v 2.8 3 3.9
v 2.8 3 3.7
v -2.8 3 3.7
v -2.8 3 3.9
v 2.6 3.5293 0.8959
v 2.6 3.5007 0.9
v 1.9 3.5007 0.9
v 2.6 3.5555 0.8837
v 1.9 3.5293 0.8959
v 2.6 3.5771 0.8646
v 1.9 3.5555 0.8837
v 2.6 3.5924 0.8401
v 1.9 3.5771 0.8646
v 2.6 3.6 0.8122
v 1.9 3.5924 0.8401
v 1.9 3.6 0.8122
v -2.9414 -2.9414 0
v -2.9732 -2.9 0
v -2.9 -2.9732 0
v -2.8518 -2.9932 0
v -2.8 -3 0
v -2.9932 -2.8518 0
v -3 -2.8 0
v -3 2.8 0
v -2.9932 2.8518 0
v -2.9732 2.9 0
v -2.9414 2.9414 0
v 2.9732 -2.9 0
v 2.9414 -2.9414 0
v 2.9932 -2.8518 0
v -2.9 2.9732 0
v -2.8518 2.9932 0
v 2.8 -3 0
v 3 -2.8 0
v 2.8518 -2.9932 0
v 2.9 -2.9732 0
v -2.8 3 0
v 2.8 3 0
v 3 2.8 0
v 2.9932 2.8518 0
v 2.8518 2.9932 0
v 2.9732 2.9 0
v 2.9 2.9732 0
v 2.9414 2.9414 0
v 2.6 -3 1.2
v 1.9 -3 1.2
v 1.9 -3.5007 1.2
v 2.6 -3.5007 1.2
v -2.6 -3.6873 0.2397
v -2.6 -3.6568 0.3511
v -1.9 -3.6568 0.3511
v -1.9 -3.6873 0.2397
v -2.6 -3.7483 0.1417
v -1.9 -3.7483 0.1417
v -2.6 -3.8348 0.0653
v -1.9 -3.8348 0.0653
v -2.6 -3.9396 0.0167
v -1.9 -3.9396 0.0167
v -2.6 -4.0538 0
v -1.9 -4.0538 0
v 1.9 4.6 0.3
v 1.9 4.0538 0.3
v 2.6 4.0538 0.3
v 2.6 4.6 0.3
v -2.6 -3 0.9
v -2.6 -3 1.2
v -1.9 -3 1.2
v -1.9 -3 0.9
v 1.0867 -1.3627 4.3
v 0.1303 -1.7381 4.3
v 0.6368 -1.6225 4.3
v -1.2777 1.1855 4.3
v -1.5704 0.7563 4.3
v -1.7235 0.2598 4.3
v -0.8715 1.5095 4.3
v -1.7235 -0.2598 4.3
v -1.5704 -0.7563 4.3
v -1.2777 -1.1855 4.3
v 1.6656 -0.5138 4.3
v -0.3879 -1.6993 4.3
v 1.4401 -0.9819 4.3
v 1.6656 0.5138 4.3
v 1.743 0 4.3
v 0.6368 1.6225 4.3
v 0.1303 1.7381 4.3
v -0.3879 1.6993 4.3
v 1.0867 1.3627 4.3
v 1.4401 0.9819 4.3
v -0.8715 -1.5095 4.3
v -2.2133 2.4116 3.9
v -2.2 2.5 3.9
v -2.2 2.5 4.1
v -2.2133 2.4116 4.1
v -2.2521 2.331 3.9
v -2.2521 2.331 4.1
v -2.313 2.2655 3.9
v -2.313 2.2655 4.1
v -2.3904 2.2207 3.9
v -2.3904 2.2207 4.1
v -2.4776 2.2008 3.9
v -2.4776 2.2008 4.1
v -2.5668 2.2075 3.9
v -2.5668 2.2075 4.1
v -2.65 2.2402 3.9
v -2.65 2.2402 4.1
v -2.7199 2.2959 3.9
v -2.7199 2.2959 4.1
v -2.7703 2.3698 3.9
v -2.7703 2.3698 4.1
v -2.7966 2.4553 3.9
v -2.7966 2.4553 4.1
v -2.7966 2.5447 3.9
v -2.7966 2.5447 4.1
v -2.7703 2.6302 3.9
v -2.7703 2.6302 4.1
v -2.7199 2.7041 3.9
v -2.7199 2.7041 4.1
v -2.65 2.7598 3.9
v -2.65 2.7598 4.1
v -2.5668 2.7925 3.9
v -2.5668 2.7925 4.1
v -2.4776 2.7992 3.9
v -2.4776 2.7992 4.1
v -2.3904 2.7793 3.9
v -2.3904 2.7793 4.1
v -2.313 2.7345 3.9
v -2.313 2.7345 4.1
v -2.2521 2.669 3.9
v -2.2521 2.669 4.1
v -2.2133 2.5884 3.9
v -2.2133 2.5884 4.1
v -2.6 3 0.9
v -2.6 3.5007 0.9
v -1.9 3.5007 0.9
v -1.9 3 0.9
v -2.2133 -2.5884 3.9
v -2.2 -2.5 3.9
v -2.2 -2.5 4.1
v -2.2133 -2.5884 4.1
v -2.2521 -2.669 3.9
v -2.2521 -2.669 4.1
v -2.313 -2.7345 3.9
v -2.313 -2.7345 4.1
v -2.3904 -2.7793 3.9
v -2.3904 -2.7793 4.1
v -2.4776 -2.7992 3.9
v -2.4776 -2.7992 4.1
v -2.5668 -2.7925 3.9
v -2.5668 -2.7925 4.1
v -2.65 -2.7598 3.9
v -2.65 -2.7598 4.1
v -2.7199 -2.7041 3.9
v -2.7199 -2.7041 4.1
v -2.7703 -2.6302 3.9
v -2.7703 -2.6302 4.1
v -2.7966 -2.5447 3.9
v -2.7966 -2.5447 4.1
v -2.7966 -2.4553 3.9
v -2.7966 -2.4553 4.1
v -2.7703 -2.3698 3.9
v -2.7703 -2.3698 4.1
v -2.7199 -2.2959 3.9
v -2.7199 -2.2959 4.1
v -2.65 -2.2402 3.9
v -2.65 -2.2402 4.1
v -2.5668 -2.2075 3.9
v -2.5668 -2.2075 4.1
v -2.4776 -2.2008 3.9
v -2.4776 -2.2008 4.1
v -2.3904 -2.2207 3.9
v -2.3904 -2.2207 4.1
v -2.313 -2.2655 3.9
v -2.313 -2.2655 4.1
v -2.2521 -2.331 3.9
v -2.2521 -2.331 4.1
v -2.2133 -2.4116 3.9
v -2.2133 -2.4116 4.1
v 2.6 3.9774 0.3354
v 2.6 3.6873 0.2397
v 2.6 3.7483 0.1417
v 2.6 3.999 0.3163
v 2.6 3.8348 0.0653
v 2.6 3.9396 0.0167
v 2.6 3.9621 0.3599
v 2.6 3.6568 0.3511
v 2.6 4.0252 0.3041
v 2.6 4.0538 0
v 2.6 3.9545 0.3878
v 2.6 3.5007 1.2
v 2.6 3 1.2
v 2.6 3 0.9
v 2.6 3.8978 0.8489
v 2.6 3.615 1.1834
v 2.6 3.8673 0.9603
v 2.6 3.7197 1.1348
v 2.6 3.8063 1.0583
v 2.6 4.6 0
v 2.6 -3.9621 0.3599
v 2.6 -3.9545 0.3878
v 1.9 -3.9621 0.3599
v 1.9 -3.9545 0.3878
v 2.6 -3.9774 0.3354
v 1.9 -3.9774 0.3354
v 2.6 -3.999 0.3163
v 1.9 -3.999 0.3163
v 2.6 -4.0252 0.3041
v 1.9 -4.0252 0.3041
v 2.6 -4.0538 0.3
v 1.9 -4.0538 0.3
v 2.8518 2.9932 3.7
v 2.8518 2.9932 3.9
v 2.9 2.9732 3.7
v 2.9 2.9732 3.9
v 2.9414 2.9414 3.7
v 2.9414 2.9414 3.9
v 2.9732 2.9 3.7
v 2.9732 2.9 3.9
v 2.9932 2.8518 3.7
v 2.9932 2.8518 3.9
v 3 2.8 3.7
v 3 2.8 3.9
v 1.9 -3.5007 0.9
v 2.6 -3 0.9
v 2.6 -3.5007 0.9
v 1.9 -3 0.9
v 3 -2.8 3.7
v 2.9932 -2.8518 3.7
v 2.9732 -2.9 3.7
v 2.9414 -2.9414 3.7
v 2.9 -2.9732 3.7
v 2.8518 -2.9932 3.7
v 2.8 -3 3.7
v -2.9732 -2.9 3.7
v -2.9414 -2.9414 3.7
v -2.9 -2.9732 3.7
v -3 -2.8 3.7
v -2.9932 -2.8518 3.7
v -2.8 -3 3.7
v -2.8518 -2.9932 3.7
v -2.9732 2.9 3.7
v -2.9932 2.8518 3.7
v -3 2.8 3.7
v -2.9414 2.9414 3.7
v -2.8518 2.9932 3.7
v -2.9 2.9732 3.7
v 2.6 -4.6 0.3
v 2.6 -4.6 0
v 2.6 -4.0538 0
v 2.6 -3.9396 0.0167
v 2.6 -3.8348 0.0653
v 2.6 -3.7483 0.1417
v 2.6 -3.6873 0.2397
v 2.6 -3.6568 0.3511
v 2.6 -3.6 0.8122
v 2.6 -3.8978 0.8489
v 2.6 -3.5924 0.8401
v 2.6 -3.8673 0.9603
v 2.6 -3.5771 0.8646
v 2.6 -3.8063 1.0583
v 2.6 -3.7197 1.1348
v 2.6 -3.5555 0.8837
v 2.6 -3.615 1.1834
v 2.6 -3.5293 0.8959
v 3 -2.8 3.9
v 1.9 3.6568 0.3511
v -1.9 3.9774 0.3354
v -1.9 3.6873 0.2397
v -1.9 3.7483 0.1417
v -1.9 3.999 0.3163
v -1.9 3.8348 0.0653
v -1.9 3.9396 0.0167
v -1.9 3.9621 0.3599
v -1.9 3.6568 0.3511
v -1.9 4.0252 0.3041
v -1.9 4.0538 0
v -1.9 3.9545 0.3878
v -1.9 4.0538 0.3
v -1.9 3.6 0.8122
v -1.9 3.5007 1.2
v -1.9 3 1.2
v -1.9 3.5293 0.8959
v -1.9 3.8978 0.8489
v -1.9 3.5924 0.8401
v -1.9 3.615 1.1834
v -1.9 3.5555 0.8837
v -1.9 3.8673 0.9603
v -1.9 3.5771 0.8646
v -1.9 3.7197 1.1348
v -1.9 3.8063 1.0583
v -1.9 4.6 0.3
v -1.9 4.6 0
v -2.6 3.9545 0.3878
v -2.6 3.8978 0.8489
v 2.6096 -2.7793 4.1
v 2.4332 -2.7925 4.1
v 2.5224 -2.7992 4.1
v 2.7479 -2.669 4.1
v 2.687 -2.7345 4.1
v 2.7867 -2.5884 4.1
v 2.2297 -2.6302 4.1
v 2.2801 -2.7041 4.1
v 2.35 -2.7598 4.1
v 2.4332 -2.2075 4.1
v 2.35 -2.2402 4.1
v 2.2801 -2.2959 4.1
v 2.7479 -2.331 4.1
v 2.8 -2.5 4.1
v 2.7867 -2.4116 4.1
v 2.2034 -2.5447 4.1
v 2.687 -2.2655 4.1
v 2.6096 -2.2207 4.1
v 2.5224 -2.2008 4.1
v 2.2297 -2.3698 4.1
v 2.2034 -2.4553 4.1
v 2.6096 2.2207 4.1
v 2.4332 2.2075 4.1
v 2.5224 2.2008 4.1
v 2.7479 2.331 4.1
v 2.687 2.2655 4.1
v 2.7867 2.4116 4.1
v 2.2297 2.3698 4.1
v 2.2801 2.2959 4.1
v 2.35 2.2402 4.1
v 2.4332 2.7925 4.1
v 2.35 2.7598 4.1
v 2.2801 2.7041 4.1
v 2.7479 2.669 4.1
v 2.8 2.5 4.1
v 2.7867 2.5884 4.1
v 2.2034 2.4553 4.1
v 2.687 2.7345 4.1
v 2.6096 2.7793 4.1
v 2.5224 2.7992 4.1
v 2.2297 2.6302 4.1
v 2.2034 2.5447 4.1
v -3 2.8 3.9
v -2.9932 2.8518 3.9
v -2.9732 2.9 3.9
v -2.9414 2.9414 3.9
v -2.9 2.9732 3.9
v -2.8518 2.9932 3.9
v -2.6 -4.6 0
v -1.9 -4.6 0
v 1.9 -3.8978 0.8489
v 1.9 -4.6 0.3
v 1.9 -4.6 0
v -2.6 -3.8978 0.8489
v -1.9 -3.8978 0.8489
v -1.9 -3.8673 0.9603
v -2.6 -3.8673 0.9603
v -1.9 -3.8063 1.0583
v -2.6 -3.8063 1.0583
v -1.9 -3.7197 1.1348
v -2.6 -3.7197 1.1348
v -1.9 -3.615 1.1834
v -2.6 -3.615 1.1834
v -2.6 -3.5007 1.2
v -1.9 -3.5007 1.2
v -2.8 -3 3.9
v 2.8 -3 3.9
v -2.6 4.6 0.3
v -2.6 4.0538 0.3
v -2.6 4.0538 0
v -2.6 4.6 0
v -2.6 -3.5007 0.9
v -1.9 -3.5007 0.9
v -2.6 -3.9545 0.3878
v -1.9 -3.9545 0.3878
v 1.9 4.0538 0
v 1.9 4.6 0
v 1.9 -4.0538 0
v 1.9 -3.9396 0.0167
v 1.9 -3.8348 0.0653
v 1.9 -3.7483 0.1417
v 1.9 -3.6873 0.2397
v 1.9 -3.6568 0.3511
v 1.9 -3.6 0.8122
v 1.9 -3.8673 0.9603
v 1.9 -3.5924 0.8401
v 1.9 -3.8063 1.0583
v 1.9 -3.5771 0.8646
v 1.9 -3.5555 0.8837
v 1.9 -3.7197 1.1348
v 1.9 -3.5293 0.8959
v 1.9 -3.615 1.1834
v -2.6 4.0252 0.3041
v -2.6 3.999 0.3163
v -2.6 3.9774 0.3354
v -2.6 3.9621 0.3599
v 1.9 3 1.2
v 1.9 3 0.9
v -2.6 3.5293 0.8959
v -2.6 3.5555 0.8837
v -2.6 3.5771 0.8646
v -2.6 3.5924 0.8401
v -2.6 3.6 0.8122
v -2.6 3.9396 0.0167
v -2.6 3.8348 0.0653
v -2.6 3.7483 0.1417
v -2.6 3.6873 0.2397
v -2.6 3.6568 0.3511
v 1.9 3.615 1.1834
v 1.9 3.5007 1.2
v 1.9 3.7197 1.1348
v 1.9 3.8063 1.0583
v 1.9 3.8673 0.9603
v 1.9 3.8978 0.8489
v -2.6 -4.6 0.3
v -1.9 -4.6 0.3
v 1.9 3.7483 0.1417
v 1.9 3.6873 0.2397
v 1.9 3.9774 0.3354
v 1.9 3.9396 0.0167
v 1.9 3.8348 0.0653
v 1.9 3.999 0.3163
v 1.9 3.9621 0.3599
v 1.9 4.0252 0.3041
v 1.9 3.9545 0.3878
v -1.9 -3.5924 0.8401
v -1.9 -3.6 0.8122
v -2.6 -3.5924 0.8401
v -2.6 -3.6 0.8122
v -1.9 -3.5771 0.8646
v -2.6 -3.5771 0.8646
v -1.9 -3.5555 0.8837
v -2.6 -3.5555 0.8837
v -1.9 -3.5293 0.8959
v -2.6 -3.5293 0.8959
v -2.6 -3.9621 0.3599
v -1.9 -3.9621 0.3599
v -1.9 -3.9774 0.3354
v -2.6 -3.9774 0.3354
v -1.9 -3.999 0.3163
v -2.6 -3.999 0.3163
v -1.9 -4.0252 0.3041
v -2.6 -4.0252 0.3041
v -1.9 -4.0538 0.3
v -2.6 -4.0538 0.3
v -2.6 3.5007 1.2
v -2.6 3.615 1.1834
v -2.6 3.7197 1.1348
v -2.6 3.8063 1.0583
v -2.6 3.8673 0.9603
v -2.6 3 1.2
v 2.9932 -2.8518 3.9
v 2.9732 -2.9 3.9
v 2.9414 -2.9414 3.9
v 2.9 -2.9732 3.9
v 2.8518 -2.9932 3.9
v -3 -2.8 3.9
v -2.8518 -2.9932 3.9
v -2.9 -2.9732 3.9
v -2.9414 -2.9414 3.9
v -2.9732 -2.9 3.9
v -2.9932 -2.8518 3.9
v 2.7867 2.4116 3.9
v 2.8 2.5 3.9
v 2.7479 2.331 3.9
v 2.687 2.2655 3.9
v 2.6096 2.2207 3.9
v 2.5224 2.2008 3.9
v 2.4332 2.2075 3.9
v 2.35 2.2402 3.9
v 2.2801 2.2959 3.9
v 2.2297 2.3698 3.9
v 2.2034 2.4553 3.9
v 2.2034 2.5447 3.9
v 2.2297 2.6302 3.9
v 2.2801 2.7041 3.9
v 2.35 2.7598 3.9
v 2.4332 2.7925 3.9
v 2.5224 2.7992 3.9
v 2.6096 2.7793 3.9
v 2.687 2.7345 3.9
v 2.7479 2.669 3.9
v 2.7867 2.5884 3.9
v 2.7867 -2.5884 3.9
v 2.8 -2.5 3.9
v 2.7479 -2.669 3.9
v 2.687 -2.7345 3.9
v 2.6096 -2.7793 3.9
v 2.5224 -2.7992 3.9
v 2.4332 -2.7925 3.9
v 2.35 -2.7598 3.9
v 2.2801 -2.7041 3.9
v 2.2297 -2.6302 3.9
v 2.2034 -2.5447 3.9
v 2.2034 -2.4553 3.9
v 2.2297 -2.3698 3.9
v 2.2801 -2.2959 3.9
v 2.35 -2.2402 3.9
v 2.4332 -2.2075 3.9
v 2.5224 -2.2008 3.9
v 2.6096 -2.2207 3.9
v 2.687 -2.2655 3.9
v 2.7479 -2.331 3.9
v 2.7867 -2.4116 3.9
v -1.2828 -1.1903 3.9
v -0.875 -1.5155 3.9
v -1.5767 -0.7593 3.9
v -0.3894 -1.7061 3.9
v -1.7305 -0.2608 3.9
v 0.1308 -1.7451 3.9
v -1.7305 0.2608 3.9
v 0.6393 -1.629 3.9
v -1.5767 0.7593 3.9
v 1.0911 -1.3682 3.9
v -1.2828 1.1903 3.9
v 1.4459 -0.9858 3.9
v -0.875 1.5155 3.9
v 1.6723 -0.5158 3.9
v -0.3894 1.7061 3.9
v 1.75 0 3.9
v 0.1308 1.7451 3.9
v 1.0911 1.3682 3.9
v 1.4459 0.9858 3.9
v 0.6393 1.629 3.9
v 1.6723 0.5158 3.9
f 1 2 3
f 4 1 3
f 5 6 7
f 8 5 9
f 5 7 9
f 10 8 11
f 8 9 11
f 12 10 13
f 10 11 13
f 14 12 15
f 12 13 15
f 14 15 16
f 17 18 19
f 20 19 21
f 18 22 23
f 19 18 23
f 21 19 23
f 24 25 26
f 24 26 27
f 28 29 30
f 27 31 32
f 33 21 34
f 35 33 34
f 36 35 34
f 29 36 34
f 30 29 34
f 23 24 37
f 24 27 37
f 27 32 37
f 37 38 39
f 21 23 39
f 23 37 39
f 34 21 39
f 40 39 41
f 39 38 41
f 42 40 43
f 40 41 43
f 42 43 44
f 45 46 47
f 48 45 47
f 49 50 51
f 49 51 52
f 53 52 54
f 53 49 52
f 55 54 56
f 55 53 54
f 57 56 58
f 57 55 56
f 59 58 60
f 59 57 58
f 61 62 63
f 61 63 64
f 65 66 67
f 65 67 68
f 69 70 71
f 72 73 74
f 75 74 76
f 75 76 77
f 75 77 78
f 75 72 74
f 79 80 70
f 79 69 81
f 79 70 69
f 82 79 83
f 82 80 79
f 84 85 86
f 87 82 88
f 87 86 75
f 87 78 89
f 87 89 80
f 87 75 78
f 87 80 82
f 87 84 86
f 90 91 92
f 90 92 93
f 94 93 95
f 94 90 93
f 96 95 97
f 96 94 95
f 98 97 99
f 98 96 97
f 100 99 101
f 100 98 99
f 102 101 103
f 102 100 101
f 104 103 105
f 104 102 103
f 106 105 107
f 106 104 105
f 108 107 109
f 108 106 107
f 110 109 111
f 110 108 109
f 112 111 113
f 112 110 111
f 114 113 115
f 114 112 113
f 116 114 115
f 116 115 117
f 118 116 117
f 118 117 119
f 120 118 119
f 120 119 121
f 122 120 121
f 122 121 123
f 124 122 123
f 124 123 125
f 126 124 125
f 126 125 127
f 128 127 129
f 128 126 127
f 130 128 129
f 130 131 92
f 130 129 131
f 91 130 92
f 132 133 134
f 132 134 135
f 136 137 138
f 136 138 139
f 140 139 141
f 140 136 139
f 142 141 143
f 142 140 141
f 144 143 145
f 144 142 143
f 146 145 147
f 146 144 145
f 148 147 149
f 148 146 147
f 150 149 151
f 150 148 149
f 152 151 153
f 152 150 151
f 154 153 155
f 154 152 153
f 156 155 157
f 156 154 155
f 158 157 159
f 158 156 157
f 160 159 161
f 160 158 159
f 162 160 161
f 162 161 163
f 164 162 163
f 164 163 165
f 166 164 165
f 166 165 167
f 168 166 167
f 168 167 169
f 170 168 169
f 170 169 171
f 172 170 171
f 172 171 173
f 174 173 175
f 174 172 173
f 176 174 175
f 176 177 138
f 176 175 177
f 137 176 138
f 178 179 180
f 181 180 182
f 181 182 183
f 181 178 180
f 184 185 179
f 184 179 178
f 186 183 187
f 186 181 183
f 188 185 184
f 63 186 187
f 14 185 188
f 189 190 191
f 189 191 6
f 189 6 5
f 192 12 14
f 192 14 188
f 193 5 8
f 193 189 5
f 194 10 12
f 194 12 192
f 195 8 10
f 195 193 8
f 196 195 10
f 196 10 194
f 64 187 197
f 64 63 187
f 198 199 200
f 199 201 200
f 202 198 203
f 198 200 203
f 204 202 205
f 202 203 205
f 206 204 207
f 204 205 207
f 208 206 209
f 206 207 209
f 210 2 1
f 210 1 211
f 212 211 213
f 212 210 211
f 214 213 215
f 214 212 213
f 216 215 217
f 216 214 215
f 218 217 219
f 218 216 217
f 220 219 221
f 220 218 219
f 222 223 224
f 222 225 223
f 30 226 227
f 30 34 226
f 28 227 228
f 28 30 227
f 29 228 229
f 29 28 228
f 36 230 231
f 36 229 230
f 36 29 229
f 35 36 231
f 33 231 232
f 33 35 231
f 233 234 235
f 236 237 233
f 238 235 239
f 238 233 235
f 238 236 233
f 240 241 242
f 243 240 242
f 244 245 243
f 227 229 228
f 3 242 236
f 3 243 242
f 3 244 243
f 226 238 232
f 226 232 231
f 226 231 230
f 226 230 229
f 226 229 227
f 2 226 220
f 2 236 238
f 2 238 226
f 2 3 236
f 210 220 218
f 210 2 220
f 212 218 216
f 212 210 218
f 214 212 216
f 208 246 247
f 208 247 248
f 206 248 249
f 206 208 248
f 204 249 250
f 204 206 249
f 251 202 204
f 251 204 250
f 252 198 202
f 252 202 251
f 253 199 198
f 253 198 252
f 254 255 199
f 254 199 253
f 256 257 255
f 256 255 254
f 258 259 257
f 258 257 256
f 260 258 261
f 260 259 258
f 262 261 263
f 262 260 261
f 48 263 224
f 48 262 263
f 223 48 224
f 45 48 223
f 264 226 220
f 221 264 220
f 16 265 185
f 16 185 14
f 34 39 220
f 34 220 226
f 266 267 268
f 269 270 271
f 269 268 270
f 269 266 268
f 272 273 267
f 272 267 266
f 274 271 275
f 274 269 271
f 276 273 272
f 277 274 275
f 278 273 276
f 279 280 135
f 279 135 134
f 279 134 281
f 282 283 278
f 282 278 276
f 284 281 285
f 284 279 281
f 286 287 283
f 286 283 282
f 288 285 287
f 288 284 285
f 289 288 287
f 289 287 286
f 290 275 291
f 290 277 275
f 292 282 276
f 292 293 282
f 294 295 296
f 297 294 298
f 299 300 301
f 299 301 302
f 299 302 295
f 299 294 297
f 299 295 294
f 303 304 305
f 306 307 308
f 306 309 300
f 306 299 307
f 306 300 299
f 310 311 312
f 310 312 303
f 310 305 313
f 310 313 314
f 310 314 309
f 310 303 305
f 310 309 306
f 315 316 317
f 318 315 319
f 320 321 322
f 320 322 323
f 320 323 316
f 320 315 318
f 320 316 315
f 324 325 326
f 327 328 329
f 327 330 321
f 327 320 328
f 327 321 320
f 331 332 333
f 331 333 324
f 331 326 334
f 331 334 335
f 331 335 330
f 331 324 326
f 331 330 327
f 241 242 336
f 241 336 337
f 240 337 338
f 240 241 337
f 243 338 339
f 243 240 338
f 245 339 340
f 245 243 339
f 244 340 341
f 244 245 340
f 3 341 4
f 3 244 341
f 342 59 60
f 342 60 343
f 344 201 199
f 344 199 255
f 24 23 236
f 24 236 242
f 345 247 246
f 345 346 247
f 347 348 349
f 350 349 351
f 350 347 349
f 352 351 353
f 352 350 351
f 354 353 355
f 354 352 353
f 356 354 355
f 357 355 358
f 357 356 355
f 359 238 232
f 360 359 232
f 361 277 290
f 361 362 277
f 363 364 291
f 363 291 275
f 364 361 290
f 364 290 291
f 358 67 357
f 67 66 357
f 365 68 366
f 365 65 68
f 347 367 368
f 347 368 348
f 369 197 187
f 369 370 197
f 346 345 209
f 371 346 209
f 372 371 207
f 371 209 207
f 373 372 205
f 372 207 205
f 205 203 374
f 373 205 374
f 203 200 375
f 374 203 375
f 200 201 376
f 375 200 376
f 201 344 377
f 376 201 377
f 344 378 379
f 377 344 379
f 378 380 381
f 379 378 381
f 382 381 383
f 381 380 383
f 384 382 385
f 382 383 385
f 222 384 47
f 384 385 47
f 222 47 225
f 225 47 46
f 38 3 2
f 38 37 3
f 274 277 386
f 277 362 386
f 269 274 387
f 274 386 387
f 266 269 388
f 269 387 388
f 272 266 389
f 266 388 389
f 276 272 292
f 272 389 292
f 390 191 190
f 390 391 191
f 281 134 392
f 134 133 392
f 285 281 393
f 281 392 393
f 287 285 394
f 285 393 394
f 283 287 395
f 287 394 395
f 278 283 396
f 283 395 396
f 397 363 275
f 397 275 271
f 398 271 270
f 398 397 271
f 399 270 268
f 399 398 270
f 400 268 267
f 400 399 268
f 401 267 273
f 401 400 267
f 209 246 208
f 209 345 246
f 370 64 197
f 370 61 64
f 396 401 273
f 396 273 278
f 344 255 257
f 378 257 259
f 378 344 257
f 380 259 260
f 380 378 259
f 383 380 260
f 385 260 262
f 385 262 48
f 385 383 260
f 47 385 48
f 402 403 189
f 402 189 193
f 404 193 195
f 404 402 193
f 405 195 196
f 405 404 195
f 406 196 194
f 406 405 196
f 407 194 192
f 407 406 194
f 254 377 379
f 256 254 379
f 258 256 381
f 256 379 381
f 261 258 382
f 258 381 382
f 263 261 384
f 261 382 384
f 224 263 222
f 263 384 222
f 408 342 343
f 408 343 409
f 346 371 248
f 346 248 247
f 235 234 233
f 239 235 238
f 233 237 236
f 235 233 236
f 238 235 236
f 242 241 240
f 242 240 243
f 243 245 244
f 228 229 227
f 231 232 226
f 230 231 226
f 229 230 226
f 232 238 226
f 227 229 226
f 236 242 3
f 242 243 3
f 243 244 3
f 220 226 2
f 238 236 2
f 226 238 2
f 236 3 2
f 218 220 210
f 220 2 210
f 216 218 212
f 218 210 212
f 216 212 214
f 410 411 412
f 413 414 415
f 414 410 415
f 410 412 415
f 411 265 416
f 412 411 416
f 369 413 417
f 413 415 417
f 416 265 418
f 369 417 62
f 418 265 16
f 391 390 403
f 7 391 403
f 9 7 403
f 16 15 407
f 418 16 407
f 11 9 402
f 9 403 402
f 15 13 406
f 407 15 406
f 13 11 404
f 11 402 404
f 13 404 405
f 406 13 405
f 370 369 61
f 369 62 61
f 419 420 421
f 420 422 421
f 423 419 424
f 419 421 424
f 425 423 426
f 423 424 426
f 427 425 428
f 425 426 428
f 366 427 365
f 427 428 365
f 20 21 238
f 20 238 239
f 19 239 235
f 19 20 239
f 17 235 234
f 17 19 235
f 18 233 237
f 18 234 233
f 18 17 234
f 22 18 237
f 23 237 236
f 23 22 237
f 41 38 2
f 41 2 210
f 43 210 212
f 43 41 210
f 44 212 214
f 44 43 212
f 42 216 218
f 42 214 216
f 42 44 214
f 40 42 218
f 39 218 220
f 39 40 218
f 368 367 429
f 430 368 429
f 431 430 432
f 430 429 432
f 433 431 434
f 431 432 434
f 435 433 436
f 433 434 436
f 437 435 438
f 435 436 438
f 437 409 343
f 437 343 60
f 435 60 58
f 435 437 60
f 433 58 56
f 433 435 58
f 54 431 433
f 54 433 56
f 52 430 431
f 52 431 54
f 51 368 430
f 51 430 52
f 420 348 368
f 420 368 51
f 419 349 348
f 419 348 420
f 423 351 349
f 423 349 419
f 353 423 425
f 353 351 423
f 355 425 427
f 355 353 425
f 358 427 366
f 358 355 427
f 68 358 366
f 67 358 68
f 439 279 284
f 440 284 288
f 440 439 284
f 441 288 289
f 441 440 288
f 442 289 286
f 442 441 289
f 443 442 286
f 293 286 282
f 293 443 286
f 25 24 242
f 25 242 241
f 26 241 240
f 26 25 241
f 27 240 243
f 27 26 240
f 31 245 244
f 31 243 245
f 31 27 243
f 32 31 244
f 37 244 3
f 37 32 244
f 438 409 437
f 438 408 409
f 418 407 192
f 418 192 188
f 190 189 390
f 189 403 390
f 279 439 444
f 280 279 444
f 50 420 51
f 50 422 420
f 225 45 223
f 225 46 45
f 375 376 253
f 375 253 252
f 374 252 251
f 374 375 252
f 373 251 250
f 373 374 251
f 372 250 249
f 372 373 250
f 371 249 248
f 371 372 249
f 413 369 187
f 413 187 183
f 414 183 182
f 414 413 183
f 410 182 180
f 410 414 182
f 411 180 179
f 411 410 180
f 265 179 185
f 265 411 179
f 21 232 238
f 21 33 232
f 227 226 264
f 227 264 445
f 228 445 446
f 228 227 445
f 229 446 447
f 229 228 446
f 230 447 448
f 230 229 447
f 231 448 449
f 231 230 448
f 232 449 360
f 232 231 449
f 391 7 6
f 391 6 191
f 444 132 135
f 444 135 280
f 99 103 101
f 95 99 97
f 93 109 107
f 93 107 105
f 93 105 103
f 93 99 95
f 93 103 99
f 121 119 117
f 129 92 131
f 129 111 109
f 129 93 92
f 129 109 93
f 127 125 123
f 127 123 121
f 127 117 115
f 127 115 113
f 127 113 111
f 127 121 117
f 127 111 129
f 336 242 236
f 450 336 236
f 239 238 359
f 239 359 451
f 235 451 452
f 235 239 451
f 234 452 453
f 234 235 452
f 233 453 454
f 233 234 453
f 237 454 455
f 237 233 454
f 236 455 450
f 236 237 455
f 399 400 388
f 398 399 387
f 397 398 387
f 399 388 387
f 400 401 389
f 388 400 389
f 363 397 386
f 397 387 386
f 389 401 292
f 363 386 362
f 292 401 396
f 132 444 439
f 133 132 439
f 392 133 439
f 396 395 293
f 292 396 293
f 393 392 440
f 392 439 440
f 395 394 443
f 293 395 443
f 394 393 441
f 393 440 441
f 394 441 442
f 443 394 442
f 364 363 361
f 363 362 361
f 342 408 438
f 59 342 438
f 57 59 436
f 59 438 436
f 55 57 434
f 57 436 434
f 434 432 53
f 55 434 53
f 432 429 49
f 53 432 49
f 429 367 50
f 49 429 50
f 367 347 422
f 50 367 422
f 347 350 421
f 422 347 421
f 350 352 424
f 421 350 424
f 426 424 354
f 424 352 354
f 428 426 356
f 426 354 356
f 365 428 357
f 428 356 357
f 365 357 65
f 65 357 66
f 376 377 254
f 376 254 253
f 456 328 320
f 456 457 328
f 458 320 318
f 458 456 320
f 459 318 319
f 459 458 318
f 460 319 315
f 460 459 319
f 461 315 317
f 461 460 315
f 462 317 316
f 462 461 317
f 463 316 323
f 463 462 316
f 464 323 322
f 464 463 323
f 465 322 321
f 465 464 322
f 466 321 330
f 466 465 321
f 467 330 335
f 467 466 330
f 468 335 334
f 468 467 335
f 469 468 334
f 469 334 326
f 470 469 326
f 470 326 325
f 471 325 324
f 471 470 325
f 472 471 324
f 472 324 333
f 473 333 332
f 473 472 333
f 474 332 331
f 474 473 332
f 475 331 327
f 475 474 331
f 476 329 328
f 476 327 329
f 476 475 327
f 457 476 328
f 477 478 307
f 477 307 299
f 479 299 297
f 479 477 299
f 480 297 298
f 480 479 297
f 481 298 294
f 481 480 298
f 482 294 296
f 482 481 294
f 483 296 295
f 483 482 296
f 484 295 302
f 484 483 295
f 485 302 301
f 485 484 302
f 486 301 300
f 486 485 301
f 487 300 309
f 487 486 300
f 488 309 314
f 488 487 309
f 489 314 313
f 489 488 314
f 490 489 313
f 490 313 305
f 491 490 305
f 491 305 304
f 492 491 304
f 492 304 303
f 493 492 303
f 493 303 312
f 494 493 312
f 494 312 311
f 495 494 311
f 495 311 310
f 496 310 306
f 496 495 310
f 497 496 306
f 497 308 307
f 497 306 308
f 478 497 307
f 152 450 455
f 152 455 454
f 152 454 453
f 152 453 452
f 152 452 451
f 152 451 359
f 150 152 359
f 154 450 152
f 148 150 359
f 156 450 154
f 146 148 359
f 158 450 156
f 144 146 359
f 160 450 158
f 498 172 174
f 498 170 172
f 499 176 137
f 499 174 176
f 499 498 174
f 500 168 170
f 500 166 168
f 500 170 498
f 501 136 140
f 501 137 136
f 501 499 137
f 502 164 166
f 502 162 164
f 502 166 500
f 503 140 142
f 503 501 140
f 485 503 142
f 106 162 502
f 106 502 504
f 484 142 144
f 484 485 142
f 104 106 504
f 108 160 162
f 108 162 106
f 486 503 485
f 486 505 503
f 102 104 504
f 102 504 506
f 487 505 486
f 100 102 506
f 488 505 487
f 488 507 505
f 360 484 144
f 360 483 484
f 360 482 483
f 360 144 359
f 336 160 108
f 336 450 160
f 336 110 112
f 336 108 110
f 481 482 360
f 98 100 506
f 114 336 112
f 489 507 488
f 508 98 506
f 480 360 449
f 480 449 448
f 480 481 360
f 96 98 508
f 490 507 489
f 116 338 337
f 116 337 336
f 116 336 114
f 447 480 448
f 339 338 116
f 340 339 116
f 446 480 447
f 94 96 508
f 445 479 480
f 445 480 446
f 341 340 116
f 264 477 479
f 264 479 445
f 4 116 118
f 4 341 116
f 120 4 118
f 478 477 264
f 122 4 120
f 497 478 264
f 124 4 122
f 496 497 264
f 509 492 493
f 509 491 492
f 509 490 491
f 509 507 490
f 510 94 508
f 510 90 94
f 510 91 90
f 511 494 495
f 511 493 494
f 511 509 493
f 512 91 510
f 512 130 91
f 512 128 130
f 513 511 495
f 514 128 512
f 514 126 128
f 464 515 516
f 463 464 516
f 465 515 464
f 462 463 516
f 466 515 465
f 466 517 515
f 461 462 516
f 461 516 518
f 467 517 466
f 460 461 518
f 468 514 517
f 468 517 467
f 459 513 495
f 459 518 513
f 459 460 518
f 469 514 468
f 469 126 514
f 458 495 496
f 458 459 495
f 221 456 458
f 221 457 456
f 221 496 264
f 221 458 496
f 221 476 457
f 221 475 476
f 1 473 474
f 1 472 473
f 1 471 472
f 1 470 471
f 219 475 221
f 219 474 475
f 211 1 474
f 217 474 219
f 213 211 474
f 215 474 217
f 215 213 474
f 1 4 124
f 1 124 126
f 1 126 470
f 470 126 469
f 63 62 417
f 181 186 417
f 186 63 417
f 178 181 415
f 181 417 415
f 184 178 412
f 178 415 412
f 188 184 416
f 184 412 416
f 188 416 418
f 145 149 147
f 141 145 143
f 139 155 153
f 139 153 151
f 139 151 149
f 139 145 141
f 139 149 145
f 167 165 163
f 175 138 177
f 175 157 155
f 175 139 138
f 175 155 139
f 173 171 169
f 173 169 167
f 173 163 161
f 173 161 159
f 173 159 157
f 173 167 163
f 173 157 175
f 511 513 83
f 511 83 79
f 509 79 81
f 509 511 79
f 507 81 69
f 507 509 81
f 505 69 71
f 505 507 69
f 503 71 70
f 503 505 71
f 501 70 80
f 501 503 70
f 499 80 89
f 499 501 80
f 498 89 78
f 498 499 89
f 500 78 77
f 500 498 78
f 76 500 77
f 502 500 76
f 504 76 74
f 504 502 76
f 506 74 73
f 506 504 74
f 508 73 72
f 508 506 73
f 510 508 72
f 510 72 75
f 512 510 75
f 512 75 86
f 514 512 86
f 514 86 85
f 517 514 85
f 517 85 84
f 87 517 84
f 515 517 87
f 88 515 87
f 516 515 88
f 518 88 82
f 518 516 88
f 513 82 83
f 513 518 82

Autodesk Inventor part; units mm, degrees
ref_plane "YZ Plane" through (0, 0, 0) normal (1, 0, 0) x (0, 1, 0)
ref_plane "XZ Plane" through (0, 0, 0) normal (0, 1, 0) x (-1, 0, 0)
ref_plane "XY Plane" through (0, 0, 0) normal (0, 0, 1) x (1, 0, 0)
sketch "Boceto39" plane through (0, 0, 0) normal (0, 0, 1) x (1, 0, 0)
  line L0 (-2.8, 3) -> (2.8, 3)
  line L1 (3, 2.8) -> (3, -2.8)
  line L2 (2.8, -3) -> (-2.8, -3)
  line L3 (-3, -2.8) -> (-3, 2.8)
  arc A0 (3, 2.8) -> (2.8, 3) centre (2.8, 2.8) ccw
  arc A1 (-2.8, 3) -> (-3, 2.8) centre (-2.8, 2.8) ccw
  arc A2 (-3, -2.8) -> (-2.8, -3) centre (-2.8, -2.8) ccw
  arc A3 (2.8, -3) -> (3, -2.8) centre (2.8, -2.8) ccw
  point P0 (0, 0)
  point P1 (-3, 3)
  point P2 (3, -3)
  point P3 (3, 3)
  point P4 (-3, -3)
  point P5 (0, 3)
  point P6 (3, 0)
  dimension "d373" = 6
  dimension "d376" = 0.2
extrude "Extrusión13" add sketch "Boceto39" along normal blind 3.7
sketch "Boceto40" plane through (0, 0, 3.7) normal (0, 0, 1) x (1, 0, 0)
  line L0 (2.8, 3) -> (-2.8, 3) projected
  arc A0 (-2.8, 3) -> (-3, 2.8) centre (-2.8, 2.8) ccw projected
  line L1 (-3, 2.8) -> (-3, -2.8) projected
  arc A1 (-3, -2.8) -> (-2.8, -3) centre (-2.8, -2.8) ccw projected
  line L2 (-2.8, -3) -> (2.8, -3) projected
  arc A2 (2.8, -3) -> (3, -2.8) centre (2.8, -2.8) ccw projected
  line L3 (3, -2.8) -> (3, 2.8) projected
  arc A3 (3, 2.8) -> (2.8, 3) centre (2.8, 2.8) ccw projected
  point P0 (0, 0)
extrude "Extrusión14" add sketch "Boceto40" along normal blind 0.2 separate body
sketch "Boceto43" plane through (0, 0, 0) normal (1, 0, 0) x (0, 1, 0)
  line L0 (0, 0) -> (0, -3.6276) construction
  line L1 (3, 0) -> (3, 3.7) construction
  line L2 (3.5007, 1.2) -> (3, 1.2)
  line L3 (2.8, 3.9) -> (-2.8, 3.9) projected
  line L4 (2.8, 0) -> (-2.8, 0) projected
  line L5 (3.5007, 0.9) -> (3, 0.9)
  line L6 (3, 0.9) -> (3, 1.2)
  arc A0 (3.6, 0.8122) -> (3.5007, 0.9) centre (3.5007, 0.8) ccw
  arc A1 (3.8978, 0.8489) -> (3.5007, 1.2) centre (3.5007, 0.8) ccw
  line L7 (3.8978, 0.8489) -> (3.9545, 0.3878)
  line L8 (4.0538, 0.3) -> (4.6, 0.3)
  line L9 (4.6, 0.3) -> (4.6, 0)
  line L10 (4.6, 0) -> (4.0538, 0)
  line L11 (3.6568, 0.3511) -> (3.6, 0.8122)
  arc A2 (3.9545, 0.3878) -> (4.0538, 0.3) centre (4.0538, 0.4) ccw
  arc A3 (3.6568, 0.3511) -> (4.0538, 0) centre (4.0538, 0.4) ccw
  point P0 (6.55, 1.2)
  point P1 (3.7, 0)
  dimension "d399" = 2.7
  dimension "d426" = 0.3
  dimension "d435" = 0.1
  dimension "d436" = 0.4
  dimension "d437" = 0.3
  dimension "d438" = 0.3
  dimension "d439" = 4.6
  dimension "d440" = 3.6
  dimension "d441" = 0.9
  dimension "d442" = 0.1
  dimension "d443" = 0.4
extrude "Extrusión15" add sketch "Boceto43" along normal mid plane 5.2 separate body
sketch "Boceto45" plane through (0, 0, 0) normal (1, 0, 0) x (0, 1, 0)
  line L0 (3, 1.2) -> (3.5007, 1.2) projected
  line L1 (3, 1.2) -> (5.6614, 1.2)
  line L2 (5.6614, 1.2) -> (5.6614, -2.2134)
  line L3 (5.6614, -2.2134) -> (3, -2.2134)
  line L4 (3, -2.2134) -> (3, 1.2)
  point P0 (0, 0)
  point P1 (3.3, 0.8)
extrude "Extrusión17" cut sketch "Boceto45" along normal mid plane 3.8 bodies 3
mirror "Simetría1" about plane through (0, 0, 0) normal (0, 1, 0) of "Extrusión15", "Extrusión17" bodies 3
sketch "Boceto48" plane through (0, 0, 0) normal (0, 1, 0) x (-1, 0, 0)
  line L0 (0, 0) -> (0, 17.1627)
  line L1 (-2.8, 3.9) -> (2.8, 3.9) construction
  line L2 (0, 3.9) -> (-1.75, 3.9)
  line L3 (-1.75, 3.9) -> (-1.743, 4.3)
  line L4 (-1.743, 4.3) -> (0, 4.3)
  line L5 (0, 4.3) -> (0, 3.9)
  line L6 (-2.8, 0) -> (2.8, 0) projected
  line L7 (-1.75, 3.9) -> (-1.75, 4.5675) construction
  dimension "d422" = 4.3
  dimension "d423" = 3.5
  dimension "d424" = 1
revolve "Revolución14" add sketch "Boceto48" angle 360 about axis through (0, 0, 0) along (0, 0, 1) bodies 2
sketch "Boceto46" plane through (0, 0, 3.9) normal (0, 0, 1) x (1, 0, 0)
  line L0 (-2.5, -2.5) -> (2.5, -2.5) construction
  line L1 (2.5, -2.5) -> (2.5, 2.5) construction
  line L2 (2.5, 2.5) -> (-2.5, 2.5) construction
  line L3 (-2.5, 2.5) -> (-2.5, -2.5) construction
  circle A0 centre (-2.5, -2.5) radius 0.3
  circle A1 centre (-2.5, 2.5) radius 0.3
  circle A2 centre (2.5, 2.5) radius 0.3
  circle A3 centre (2.5, -2.5) radius 0.3
  point P0 (0, 0)
  point P1 (0, -2.5)
  point P2 (-2.5, 0)
  dimension "d417" = 0.6
  dimension "d418" = 5
extrude "Extrusión18" add sketch "Boceto46" along normal blind 0.2 bodies 2
sketch "Boceto49" plane through (0, 0, 0) normal (0, 0, -1) x (-1, 0, 0)
  circle A0 centre (-4.5, 0) radius 0.8
  circle A1 centre (4.5, 0) radius 0.8
  point P0 (0, 0)
  dimension "d444" = 9
  dimension "d445" = 4.5
  dimension "d446" = 1.6
properties part number "TACT-SWITCH-SMD-06X06MM"
